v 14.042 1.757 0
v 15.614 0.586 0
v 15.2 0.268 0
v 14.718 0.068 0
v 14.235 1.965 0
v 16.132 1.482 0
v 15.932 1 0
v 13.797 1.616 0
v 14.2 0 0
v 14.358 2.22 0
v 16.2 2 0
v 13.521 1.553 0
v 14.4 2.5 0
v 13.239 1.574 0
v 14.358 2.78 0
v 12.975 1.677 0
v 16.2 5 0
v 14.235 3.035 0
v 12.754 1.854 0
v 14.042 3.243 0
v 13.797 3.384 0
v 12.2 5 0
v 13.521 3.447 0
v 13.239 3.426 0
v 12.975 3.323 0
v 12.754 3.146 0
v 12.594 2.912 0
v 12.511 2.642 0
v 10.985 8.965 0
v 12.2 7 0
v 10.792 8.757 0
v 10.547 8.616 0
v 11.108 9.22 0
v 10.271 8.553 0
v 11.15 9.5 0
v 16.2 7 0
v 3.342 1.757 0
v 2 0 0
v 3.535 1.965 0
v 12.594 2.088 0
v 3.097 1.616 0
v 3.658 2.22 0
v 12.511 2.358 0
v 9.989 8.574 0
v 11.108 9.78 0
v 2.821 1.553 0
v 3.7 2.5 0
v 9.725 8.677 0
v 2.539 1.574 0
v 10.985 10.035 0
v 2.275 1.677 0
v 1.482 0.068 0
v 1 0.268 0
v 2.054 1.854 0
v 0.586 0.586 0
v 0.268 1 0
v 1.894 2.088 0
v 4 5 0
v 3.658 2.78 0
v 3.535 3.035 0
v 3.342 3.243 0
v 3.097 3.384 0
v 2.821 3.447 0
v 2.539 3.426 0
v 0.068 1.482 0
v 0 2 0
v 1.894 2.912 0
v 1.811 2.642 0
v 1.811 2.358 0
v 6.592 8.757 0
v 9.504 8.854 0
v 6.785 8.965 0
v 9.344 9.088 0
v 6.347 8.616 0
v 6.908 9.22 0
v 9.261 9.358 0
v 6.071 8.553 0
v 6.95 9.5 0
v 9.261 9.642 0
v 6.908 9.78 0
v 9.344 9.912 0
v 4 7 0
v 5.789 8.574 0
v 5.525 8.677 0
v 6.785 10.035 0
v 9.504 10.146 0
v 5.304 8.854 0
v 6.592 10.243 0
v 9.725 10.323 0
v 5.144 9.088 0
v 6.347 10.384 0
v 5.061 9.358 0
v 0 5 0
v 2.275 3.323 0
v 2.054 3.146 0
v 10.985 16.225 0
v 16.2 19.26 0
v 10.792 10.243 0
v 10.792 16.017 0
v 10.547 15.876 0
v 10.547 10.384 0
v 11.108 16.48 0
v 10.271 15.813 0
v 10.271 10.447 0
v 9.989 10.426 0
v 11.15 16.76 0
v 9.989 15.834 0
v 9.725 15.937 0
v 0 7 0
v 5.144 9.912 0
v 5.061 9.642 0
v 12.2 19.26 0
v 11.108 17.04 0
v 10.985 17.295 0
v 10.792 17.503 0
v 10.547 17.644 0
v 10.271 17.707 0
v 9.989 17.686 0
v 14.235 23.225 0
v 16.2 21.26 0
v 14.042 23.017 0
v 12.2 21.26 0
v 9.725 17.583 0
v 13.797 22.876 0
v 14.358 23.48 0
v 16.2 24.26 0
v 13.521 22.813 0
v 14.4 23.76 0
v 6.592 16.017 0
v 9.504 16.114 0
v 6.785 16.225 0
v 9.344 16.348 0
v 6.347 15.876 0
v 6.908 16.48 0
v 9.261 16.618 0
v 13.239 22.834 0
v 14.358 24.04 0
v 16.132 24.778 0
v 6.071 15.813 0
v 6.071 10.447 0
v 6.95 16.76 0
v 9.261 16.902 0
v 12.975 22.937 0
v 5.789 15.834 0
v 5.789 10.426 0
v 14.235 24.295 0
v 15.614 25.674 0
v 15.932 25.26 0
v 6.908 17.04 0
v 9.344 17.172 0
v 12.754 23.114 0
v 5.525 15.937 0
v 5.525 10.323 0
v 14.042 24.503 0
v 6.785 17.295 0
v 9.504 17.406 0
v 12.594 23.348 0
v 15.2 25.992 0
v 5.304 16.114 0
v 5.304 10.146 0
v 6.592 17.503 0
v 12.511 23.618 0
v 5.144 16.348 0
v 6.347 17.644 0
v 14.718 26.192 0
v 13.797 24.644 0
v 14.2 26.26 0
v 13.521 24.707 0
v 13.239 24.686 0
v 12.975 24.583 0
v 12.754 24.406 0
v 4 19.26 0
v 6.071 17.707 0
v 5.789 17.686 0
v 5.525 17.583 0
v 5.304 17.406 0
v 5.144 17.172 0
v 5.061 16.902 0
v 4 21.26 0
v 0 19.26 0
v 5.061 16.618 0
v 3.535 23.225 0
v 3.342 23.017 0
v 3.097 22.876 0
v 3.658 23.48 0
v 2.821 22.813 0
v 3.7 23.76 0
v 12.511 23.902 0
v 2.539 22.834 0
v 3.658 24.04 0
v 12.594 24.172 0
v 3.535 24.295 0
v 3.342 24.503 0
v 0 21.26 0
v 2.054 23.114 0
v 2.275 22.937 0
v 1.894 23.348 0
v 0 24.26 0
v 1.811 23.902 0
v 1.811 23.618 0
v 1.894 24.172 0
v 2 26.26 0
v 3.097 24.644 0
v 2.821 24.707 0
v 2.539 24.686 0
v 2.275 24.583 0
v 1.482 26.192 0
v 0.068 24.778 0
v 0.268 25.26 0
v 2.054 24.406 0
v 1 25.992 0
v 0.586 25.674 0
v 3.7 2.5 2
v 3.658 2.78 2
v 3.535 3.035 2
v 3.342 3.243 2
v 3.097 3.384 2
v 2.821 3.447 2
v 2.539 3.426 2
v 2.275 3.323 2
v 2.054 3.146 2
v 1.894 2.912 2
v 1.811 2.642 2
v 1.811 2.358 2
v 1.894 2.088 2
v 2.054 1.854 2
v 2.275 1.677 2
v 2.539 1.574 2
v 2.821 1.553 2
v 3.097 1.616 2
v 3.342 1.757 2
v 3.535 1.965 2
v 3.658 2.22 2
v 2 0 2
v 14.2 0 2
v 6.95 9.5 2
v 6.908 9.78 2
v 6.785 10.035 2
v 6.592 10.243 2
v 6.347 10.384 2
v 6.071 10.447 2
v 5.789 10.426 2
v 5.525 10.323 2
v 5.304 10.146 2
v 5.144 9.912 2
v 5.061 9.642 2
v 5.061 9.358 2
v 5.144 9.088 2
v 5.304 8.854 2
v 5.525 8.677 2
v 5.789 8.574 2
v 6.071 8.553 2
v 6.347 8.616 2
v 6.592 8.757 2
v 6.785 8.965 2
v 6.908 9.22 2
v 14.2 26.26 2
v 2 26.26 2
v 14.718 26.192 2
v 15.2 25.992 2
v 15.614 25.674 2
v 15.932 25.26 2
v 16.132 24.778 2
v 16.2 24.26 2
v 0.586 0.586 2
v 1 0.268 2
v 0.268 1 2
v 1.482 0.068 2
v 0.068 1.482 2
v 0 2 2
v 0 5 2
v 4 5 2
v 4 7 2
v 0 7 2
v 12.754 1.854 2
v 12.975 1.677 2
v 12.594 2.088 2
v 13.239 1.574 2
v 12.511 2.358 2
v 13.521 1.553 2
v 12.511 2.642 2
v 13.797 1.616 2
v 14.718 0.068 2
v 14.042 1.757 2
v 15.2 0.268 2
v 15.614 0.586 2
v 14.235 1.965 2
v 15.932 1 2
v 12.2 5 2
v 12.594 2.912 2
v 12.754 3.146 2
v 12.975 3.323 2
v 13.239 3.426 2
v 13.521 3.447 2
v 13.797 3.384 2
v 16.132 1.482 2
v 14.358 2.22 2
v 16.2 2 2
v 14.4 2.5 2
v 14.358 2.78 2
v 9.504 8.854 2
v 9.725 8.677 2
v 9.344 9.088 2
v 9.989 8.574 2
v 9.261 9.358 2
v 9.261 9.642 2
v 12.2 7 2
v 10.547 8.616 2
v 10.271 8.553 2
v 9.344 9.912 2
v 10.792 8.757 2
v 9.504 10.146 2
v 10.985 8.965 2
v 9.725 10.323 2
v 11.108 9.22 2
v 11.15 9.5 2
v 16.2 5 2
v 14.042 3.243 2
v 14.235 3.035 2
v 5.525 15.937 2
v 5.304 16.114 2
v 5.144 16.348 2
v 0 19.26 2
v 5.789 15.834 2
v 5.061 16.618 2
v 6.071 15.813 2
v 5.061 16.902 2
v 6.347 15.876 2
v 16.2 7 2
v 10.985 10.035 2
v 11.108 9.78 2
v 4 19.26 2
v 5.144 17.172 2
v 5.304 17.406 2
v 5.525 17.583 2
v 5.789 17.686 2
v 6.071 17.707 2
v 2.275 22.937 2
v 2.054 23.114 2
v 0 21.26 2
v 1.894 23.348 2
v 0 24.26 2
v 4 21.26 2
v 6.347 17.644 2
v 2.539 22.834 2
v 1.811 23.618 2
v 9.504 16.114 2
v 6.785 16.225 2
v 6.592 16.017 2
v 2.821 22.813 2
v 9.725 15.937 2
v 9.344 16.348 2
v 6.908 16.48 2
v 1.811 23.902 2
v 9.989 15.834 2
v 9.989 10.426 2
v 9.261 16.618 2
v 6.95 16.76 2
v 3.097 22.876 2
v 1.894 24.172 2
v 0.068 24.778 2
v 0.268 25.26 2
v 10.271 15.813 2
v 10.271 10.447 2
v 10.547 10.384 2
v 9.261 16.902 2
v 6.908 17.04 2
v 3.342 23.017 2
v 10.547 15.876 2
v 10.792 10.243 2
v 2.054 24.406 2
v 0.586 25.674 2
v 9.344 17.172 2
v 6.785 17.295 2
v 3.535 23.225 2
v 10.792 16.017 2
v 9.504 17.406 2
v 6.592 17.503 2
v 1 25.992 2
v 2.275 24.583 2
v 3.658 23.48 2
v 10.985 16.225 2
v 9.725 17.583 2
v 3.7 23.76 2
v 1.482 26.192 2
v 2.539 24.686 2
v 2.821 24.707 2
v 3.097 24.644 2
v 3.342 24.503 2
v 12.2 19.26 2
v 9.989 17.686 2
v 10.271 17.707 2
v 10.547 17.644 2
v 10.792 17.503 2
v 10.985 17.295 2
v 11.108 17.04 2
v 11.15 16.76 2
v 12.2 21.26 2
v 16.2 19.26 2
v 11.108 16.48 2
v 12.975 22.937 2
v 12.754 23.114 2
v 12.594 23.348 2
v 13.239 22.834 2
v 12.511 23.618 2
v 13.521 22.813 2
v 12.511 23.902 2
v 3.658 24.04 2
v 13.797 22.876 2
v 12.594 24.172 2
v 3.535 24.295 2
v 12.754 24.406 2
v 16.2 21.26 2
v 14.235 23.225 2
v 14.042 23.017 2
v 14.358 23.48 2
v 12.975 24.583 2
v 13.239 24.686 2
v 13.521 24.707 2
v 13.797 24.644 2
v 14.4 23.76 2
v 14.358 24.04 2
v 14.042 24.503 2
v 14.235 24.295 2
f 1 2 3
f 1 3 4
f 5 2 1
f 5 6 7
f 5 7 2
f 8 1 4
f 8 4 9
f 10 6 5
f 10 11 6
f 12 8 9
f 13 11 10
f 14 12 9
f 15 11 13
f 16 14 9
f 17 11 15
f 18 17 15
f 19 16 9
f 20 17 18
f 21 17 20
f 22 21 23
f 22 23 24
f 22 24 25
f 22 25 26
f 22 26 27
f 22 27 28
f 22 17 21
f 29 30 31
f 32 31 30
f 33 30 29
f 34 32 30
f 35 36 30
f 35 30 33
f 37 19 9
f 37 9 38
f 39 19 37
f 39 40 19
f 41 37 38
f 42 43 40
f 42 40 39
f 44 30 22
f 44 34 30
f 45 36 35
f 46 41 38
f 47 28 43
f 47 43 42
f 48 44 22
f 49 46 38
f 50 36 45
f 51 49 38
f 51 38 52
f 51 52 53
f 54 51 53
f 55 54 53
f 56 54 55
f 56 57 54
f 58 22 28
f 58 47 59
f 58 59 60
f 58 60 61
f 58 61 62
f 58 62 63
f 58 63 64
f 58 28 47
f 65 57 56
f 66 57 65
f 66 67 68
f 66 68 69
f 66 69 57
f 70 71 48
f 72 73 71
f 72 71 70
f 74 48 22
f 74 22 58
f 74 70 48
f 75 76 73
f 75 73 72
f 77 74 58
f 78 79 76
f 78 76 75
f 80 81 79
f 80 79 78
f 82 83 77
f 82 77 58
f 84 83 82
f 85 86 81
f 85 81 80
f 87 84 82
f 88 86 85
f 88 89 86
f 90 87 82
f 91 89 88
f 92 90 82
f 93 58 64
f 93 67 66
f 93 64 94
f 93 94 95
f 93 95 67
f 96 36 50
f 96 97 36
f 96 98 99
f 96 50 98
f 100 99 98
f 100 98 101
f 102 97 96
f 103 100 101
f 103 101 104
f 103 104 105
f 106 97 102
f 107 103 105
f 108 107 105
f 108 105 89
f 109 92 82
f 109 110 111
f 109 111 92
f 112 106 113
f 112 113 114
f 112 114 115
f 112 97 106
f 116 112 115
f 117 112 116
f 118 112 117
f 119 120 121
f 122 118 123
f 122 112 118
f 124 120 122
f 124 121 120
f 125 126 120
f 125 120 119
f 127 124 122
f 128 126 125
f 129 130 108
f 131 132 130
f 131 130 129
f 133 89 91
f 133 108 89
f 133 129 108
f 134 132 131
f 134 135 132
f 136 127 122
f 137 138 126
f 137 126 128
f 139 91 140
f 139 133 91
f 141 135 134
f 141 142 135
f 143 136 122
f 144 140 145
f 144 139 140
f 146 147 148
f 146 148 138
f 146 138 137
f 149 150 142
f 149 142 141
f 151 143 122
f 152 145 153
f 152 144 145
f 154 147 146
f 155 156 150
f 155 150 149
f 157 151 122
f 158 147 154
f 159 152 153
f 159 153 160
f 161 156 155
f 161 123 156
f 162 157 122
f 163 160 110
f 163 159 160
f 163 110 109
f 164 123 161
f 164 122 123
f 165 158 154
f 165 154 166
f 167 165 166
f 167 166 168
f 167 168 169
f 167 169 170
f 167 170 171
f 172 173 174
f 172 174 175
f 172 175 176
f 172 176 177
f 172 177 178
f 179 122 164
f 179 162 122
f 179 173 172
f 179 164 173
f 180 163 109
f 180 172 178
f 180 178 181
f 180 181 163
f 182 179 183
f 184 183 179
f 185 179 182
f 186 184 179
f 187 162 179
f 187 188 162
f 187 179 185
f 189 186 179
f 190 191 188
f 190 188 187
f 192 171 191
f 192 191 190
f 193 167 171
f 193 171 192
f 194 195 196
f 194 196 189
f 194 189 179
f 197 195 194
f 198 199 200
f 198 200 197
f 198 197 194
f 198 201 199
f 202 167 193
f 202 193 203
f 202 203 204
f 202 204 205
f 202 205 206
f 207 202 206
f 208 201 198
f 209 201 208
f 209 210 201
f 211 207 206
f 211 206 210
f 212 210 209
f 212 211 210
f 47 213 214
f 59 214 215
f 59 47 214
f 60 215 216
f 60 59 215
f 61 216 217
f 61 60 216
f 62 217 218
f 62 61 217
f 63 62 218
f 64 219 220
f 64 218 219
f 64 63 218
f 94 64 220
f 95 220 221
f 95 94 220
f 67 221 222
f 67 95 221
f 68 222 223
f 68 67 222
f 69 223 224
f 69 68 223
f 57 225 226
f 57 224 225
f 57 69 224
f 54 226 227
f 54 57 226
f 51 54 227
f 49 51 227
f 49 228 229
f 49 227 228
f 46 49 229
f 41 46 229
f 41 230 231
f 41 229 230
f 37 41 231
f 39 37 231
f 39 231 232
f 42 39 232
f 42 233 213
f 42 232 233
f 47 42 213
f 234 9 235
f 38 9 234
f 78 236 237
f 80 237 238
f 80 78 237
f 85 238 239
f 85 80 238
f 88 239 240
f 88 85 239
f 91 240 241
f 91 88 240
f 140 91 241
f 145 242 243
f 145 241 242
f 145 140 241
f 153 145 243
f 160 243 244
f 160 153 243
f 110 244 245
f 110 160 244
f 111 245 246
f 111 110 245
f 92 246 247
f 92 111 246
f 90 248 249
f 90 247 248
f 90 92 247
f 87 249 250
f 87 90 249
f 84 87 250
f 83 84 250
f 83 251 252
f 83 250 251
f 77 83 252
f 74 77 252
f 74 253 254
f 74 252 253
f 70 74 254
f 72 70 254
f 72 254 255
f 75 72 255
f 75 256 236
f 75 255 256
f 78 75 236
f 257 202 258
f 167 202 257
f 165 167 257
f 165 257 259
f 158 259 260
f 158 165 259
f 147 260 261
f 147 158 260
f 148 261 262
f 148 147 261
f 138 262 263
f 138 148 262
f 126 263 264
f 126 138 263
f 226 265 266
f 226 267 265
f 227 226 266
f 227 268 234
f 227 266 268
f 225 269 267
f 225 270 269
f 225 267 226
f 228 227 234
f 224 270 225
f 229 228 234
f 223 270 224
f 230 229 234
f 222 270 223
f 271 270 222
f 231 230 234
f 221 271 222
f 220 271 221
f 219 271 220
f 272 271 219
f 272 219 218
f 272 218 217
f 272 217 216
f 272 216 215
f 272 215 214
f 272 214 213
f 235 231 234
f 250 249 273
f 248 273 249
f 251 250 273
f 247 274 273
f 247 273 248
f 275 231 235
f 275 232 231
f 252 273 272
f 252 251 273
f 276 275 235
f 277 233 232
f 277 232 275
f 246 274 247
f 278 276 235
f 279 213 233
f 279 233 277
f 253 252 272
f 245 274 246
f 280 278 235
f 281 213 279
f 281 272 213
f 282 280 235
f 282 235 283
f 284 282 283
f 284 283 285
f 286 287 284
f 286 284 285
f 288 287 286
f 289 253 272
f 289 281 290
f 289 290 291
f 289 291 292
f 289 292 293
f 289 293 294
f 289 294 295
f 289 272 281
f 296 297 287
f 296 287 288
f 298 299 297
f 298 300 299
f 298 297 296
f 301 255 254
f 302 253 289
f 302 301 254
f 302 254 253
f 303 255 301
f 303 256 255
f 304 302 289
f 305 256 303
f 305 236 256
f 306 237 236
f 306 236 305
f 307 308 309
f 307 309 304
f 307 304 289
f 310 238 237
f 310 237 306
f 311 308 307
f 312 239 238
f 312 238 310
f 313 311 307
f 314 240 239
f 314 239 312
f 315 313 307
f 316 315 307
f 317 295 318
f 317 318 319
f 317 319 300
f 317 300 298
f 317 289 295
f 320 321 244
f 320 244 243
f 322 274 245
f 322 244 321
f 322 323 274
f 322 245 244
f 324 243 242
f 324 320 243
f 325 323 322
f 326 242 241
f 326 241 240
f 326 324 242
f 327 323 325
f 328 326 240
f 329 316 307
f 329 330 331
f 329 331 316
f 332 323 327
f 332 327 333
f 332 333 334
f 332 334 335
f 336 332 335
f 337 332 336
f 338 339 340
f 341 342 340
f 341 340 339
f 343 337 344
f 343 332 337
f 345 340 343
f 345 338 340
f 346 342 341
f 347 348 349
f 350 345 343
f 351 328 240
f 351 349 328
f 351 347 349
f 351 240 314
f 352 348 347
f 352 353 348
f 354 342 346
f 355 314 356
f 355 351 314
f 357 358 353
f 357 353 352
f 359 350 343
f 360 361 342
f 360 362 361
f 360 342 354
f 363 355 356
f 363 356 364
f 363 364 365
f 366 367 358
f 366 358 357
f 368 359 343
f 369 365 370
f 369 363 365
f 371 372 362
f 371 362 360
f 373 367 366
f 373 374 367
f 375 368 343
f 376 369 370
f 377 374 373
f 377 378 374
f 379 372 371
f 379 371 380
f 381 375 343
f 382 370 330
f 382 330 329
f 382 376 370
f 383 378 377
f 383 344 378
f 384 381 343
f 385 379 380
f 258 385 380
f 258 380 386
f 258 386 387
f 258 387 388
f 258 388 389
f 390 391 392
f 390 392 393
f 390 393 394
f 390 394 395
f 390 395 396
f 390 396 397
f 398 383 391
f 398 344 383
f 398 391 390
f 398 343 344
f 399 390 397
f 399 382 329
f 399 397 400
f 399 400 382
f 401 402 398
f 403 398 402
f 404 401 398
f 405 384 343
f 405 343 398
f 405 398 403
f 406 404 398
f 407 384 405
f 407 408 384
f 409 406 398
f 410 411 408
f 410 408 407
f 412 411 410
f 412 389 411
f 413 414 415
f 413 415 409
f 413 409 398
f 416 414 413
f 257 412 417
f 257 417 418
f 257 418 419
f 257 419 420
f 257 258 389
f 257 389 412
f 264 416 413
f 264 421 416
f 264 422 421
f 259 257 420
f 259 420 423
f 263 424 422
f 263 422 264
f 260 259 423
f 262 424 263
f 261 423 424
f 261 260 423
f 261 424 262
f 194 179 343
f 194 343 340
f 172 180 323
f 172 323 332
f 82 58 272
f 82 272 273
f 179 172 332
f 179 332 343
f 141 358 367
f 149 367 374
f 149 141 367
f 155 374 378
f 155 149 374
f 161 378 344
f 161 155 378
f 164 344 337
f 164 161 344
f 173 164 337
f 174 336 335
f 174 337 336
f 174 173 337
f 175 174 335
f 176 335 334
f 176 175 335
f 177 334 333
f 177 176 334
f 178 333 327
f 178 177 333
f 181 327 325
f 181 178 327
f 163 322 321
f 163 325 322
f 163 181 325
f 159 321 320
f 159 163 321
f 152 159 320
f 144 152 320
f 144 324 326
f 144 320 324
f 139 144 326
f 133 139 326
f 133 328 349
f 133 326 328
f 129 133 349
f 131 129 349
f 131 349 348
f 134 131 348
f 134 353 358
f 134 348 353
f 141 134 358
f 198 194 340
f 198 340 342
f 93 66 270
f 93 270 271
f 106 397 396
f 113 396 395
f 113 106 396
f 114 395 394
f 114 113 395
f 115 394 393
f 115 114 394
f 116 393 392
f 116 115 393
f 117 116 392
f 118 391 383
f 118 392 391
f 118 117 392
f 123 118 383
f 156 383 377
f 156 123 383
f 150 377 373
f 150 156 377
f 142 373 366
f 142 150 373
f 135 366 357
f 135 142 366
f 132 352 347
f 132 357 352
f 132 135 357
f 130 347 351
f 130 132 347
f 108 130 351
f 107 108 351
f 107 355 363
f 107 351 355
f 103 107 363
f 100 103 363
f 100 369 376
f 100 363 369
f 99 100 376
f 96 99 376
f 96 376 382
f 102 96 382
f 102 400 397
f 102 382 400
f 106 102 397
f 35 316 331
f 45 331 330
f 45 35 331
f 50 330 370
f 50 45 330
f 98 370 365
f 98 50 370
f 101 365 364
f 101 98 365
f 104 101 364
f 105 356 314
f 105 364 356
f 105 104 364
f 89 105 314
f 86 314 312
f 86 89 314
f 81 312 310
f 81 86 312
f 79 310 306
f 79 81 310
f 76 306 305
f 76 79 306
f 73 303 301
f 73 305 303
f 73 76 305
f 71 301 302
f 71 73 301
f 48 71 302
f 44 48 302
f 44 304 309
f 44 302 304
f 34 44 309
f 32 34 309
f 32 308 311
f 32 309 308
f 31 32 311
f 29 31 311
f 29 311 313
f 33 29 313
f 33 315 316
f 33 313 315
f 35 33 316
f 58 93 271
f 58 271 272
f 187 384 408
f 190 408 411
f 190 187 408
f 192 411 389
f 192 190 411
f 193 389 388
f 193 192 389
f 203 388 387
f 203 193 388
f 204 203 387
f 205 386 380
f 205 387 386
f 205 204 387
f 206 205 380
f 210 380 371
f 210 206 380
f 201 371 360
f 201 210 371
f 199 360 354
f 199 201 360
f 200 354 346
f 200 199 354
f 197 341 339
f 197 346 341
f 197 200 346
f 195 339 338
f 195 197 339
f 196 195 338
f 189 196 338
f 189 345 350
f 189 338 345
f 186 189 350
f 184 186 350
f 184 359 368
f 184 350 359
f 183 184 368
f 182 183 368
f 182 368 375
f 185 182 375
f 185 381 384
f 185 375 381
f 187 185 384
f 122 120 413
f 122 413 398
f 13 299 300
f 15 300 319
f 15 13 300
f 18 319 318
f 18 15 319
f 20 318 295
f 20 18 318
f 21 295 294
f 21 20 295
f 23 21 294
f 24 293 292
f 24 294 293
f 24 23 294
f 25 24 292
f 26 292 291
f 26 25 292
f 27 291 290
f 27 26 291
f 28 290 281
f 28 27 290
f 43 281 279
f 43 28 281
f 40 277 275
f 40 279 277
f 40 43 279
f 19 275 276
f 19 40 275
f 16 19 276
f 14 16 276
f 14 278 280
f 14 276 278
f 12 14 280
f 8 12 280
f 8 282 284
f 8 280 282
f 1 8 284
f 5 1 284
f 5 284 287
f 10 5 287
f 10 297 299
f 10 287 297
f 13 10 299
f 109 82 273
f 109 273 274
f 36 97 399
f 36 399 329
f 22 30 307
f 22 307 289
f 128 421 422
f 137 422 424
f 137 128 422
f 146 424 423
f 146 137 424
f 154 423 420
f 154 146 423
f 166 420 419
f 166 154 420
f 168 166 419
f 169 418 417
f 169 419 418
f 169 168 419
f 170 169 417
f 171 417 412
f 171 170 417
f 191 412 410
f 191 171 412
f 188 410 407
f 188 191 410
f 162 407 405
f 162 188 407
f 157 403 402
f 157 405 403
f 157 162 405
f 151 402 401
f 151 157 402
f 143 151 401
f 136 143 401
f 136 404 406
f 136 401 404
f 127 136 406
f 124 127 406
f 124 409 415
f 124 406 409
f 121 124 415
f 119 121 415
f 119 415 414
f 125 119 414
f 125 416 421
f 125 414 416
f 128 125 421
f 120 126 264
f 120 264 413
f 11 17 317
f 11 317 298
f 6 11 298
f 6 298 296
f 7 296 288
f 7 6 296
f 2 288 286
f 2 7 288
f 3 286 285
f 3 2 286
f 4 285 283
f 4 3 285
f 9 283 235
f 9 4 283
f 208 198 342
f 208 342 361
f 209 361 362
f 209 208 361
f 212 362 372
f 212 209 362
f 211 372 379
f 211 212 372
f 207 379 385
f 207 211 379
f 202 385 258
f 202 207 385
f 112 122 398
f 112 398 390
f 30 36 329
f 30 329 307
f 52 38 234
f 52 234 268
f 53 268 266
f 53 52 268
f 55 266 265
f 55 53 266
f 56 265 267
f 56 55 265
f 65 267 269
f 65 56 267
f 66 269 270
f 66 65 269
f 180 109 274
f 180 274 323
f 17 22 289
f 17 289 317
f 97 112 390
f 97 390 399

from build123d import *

# Parameters (mm, degrees)
SKETCH2_R           = 0.95
BOSS_EXTRUDE1_DEPTH = 4
SKETCH3_W           = 16.2
SKETCH3_H           = 26.26
CUT_EXTRUDE1_DEPTH  = 2


with BuildPart() as part:
    # Sketch2 → Boss-Extrude1 (new body)
    with BuildSketch(Plane.XY):
        with BuildLine():
            Line((0, 7), (0, 19.26))
            Line((0, 19.26), (4, 19.26))
            Line((4, 19.26), (4, 21.26))
            Line((4, 21.26), (0, 21.26))
            Line((0, 21.26), (0, 24.26))
            ThreePointArc((0, 24.26), (0.585786438, 25.674213562), (2, 26.26))
            Line((2, 26.26), (14.2, 26.26))
            ThreePointArc((14.2, 26.26), (15.614213562, 25.674213562), (16.2, 24.26))
            Line((16.2, 24.26), (16.2, 21.26))
            Line((16.2, 21.26), (12.2, 21.26))
            Line((12.2, 21.26), (12.2, 19.26))
            Line((12.2, 19.26), (16.2, 19.26))
            Line((16.2, 19.26), (16.2, 7))
            Line((16.2, 7), (12.2, 7))
            Line((12.2, 7), (12.2, 5))
            Line((12.2, 5), (16.2, 5))
            Line((16.2, 5), (16.2, 2))
            ThreePointArc((16.2, 2), (15.614213562, 0.585786438), (14.2, 0))
            Line((14.2, 0), (2, 0))
            ThreePointArc((2, 0), (0.585786438, 0.585786438), (0, 2))
            Line((0, 2), (0, 5))
            Line((0, 5), (4, 5))
            Line((4, 5), (4, 7))
            Line((4, 7), (0, 7))
        make_face()
        with Locations((13.45, 2.5)):
            Circle(SKETCH2_R, mode=Mode.SUBTRACT)
        with Locations((10.2, 9.5)):
            Circle(SKETCH2_R, mode=Mode.SUBTRACT)
        with Locations((2.75, 23.76)):
            Circle(SKETCH2_R, mode=Mode.SUBTRACT)
        with Locations((6, 16.76)):
            Circle(SKETCH2_R, mode=Mode.SUBTRACT)
        with Locations((10.2, 16.76)):
            Circle(SKETCH2_R, mode=Mode.SUBTRACT)
        with Locations((13.45, 23.76)):
            Circle(SKETCH2_R, mode=Mode.SUBTRACT)
        with Locations((6, 9.5)):
            Circle(SKETCH2_R, mode=Mode.SUBTRACT)
        with Locations((2.75, 2.5)):
            Circle(SKETCH2_R, mode=Mode.SUBTRACT)
    extrude(amount=BOSS_EXTRUDE1_DEPTH)

    # Sketch3 → Cut-Extrude1 (cut)
    with BuildSketch(Plane.XY.offset(4)):
        with Locations((8.1, 13.13)):
            Rectangle(SKETCH3_W, SKETCH3_H)
    extrude(amount=-CUT_EXTRUDE1_DEPTH, mode=Mode.SUBTRACT)


solid = part.part
